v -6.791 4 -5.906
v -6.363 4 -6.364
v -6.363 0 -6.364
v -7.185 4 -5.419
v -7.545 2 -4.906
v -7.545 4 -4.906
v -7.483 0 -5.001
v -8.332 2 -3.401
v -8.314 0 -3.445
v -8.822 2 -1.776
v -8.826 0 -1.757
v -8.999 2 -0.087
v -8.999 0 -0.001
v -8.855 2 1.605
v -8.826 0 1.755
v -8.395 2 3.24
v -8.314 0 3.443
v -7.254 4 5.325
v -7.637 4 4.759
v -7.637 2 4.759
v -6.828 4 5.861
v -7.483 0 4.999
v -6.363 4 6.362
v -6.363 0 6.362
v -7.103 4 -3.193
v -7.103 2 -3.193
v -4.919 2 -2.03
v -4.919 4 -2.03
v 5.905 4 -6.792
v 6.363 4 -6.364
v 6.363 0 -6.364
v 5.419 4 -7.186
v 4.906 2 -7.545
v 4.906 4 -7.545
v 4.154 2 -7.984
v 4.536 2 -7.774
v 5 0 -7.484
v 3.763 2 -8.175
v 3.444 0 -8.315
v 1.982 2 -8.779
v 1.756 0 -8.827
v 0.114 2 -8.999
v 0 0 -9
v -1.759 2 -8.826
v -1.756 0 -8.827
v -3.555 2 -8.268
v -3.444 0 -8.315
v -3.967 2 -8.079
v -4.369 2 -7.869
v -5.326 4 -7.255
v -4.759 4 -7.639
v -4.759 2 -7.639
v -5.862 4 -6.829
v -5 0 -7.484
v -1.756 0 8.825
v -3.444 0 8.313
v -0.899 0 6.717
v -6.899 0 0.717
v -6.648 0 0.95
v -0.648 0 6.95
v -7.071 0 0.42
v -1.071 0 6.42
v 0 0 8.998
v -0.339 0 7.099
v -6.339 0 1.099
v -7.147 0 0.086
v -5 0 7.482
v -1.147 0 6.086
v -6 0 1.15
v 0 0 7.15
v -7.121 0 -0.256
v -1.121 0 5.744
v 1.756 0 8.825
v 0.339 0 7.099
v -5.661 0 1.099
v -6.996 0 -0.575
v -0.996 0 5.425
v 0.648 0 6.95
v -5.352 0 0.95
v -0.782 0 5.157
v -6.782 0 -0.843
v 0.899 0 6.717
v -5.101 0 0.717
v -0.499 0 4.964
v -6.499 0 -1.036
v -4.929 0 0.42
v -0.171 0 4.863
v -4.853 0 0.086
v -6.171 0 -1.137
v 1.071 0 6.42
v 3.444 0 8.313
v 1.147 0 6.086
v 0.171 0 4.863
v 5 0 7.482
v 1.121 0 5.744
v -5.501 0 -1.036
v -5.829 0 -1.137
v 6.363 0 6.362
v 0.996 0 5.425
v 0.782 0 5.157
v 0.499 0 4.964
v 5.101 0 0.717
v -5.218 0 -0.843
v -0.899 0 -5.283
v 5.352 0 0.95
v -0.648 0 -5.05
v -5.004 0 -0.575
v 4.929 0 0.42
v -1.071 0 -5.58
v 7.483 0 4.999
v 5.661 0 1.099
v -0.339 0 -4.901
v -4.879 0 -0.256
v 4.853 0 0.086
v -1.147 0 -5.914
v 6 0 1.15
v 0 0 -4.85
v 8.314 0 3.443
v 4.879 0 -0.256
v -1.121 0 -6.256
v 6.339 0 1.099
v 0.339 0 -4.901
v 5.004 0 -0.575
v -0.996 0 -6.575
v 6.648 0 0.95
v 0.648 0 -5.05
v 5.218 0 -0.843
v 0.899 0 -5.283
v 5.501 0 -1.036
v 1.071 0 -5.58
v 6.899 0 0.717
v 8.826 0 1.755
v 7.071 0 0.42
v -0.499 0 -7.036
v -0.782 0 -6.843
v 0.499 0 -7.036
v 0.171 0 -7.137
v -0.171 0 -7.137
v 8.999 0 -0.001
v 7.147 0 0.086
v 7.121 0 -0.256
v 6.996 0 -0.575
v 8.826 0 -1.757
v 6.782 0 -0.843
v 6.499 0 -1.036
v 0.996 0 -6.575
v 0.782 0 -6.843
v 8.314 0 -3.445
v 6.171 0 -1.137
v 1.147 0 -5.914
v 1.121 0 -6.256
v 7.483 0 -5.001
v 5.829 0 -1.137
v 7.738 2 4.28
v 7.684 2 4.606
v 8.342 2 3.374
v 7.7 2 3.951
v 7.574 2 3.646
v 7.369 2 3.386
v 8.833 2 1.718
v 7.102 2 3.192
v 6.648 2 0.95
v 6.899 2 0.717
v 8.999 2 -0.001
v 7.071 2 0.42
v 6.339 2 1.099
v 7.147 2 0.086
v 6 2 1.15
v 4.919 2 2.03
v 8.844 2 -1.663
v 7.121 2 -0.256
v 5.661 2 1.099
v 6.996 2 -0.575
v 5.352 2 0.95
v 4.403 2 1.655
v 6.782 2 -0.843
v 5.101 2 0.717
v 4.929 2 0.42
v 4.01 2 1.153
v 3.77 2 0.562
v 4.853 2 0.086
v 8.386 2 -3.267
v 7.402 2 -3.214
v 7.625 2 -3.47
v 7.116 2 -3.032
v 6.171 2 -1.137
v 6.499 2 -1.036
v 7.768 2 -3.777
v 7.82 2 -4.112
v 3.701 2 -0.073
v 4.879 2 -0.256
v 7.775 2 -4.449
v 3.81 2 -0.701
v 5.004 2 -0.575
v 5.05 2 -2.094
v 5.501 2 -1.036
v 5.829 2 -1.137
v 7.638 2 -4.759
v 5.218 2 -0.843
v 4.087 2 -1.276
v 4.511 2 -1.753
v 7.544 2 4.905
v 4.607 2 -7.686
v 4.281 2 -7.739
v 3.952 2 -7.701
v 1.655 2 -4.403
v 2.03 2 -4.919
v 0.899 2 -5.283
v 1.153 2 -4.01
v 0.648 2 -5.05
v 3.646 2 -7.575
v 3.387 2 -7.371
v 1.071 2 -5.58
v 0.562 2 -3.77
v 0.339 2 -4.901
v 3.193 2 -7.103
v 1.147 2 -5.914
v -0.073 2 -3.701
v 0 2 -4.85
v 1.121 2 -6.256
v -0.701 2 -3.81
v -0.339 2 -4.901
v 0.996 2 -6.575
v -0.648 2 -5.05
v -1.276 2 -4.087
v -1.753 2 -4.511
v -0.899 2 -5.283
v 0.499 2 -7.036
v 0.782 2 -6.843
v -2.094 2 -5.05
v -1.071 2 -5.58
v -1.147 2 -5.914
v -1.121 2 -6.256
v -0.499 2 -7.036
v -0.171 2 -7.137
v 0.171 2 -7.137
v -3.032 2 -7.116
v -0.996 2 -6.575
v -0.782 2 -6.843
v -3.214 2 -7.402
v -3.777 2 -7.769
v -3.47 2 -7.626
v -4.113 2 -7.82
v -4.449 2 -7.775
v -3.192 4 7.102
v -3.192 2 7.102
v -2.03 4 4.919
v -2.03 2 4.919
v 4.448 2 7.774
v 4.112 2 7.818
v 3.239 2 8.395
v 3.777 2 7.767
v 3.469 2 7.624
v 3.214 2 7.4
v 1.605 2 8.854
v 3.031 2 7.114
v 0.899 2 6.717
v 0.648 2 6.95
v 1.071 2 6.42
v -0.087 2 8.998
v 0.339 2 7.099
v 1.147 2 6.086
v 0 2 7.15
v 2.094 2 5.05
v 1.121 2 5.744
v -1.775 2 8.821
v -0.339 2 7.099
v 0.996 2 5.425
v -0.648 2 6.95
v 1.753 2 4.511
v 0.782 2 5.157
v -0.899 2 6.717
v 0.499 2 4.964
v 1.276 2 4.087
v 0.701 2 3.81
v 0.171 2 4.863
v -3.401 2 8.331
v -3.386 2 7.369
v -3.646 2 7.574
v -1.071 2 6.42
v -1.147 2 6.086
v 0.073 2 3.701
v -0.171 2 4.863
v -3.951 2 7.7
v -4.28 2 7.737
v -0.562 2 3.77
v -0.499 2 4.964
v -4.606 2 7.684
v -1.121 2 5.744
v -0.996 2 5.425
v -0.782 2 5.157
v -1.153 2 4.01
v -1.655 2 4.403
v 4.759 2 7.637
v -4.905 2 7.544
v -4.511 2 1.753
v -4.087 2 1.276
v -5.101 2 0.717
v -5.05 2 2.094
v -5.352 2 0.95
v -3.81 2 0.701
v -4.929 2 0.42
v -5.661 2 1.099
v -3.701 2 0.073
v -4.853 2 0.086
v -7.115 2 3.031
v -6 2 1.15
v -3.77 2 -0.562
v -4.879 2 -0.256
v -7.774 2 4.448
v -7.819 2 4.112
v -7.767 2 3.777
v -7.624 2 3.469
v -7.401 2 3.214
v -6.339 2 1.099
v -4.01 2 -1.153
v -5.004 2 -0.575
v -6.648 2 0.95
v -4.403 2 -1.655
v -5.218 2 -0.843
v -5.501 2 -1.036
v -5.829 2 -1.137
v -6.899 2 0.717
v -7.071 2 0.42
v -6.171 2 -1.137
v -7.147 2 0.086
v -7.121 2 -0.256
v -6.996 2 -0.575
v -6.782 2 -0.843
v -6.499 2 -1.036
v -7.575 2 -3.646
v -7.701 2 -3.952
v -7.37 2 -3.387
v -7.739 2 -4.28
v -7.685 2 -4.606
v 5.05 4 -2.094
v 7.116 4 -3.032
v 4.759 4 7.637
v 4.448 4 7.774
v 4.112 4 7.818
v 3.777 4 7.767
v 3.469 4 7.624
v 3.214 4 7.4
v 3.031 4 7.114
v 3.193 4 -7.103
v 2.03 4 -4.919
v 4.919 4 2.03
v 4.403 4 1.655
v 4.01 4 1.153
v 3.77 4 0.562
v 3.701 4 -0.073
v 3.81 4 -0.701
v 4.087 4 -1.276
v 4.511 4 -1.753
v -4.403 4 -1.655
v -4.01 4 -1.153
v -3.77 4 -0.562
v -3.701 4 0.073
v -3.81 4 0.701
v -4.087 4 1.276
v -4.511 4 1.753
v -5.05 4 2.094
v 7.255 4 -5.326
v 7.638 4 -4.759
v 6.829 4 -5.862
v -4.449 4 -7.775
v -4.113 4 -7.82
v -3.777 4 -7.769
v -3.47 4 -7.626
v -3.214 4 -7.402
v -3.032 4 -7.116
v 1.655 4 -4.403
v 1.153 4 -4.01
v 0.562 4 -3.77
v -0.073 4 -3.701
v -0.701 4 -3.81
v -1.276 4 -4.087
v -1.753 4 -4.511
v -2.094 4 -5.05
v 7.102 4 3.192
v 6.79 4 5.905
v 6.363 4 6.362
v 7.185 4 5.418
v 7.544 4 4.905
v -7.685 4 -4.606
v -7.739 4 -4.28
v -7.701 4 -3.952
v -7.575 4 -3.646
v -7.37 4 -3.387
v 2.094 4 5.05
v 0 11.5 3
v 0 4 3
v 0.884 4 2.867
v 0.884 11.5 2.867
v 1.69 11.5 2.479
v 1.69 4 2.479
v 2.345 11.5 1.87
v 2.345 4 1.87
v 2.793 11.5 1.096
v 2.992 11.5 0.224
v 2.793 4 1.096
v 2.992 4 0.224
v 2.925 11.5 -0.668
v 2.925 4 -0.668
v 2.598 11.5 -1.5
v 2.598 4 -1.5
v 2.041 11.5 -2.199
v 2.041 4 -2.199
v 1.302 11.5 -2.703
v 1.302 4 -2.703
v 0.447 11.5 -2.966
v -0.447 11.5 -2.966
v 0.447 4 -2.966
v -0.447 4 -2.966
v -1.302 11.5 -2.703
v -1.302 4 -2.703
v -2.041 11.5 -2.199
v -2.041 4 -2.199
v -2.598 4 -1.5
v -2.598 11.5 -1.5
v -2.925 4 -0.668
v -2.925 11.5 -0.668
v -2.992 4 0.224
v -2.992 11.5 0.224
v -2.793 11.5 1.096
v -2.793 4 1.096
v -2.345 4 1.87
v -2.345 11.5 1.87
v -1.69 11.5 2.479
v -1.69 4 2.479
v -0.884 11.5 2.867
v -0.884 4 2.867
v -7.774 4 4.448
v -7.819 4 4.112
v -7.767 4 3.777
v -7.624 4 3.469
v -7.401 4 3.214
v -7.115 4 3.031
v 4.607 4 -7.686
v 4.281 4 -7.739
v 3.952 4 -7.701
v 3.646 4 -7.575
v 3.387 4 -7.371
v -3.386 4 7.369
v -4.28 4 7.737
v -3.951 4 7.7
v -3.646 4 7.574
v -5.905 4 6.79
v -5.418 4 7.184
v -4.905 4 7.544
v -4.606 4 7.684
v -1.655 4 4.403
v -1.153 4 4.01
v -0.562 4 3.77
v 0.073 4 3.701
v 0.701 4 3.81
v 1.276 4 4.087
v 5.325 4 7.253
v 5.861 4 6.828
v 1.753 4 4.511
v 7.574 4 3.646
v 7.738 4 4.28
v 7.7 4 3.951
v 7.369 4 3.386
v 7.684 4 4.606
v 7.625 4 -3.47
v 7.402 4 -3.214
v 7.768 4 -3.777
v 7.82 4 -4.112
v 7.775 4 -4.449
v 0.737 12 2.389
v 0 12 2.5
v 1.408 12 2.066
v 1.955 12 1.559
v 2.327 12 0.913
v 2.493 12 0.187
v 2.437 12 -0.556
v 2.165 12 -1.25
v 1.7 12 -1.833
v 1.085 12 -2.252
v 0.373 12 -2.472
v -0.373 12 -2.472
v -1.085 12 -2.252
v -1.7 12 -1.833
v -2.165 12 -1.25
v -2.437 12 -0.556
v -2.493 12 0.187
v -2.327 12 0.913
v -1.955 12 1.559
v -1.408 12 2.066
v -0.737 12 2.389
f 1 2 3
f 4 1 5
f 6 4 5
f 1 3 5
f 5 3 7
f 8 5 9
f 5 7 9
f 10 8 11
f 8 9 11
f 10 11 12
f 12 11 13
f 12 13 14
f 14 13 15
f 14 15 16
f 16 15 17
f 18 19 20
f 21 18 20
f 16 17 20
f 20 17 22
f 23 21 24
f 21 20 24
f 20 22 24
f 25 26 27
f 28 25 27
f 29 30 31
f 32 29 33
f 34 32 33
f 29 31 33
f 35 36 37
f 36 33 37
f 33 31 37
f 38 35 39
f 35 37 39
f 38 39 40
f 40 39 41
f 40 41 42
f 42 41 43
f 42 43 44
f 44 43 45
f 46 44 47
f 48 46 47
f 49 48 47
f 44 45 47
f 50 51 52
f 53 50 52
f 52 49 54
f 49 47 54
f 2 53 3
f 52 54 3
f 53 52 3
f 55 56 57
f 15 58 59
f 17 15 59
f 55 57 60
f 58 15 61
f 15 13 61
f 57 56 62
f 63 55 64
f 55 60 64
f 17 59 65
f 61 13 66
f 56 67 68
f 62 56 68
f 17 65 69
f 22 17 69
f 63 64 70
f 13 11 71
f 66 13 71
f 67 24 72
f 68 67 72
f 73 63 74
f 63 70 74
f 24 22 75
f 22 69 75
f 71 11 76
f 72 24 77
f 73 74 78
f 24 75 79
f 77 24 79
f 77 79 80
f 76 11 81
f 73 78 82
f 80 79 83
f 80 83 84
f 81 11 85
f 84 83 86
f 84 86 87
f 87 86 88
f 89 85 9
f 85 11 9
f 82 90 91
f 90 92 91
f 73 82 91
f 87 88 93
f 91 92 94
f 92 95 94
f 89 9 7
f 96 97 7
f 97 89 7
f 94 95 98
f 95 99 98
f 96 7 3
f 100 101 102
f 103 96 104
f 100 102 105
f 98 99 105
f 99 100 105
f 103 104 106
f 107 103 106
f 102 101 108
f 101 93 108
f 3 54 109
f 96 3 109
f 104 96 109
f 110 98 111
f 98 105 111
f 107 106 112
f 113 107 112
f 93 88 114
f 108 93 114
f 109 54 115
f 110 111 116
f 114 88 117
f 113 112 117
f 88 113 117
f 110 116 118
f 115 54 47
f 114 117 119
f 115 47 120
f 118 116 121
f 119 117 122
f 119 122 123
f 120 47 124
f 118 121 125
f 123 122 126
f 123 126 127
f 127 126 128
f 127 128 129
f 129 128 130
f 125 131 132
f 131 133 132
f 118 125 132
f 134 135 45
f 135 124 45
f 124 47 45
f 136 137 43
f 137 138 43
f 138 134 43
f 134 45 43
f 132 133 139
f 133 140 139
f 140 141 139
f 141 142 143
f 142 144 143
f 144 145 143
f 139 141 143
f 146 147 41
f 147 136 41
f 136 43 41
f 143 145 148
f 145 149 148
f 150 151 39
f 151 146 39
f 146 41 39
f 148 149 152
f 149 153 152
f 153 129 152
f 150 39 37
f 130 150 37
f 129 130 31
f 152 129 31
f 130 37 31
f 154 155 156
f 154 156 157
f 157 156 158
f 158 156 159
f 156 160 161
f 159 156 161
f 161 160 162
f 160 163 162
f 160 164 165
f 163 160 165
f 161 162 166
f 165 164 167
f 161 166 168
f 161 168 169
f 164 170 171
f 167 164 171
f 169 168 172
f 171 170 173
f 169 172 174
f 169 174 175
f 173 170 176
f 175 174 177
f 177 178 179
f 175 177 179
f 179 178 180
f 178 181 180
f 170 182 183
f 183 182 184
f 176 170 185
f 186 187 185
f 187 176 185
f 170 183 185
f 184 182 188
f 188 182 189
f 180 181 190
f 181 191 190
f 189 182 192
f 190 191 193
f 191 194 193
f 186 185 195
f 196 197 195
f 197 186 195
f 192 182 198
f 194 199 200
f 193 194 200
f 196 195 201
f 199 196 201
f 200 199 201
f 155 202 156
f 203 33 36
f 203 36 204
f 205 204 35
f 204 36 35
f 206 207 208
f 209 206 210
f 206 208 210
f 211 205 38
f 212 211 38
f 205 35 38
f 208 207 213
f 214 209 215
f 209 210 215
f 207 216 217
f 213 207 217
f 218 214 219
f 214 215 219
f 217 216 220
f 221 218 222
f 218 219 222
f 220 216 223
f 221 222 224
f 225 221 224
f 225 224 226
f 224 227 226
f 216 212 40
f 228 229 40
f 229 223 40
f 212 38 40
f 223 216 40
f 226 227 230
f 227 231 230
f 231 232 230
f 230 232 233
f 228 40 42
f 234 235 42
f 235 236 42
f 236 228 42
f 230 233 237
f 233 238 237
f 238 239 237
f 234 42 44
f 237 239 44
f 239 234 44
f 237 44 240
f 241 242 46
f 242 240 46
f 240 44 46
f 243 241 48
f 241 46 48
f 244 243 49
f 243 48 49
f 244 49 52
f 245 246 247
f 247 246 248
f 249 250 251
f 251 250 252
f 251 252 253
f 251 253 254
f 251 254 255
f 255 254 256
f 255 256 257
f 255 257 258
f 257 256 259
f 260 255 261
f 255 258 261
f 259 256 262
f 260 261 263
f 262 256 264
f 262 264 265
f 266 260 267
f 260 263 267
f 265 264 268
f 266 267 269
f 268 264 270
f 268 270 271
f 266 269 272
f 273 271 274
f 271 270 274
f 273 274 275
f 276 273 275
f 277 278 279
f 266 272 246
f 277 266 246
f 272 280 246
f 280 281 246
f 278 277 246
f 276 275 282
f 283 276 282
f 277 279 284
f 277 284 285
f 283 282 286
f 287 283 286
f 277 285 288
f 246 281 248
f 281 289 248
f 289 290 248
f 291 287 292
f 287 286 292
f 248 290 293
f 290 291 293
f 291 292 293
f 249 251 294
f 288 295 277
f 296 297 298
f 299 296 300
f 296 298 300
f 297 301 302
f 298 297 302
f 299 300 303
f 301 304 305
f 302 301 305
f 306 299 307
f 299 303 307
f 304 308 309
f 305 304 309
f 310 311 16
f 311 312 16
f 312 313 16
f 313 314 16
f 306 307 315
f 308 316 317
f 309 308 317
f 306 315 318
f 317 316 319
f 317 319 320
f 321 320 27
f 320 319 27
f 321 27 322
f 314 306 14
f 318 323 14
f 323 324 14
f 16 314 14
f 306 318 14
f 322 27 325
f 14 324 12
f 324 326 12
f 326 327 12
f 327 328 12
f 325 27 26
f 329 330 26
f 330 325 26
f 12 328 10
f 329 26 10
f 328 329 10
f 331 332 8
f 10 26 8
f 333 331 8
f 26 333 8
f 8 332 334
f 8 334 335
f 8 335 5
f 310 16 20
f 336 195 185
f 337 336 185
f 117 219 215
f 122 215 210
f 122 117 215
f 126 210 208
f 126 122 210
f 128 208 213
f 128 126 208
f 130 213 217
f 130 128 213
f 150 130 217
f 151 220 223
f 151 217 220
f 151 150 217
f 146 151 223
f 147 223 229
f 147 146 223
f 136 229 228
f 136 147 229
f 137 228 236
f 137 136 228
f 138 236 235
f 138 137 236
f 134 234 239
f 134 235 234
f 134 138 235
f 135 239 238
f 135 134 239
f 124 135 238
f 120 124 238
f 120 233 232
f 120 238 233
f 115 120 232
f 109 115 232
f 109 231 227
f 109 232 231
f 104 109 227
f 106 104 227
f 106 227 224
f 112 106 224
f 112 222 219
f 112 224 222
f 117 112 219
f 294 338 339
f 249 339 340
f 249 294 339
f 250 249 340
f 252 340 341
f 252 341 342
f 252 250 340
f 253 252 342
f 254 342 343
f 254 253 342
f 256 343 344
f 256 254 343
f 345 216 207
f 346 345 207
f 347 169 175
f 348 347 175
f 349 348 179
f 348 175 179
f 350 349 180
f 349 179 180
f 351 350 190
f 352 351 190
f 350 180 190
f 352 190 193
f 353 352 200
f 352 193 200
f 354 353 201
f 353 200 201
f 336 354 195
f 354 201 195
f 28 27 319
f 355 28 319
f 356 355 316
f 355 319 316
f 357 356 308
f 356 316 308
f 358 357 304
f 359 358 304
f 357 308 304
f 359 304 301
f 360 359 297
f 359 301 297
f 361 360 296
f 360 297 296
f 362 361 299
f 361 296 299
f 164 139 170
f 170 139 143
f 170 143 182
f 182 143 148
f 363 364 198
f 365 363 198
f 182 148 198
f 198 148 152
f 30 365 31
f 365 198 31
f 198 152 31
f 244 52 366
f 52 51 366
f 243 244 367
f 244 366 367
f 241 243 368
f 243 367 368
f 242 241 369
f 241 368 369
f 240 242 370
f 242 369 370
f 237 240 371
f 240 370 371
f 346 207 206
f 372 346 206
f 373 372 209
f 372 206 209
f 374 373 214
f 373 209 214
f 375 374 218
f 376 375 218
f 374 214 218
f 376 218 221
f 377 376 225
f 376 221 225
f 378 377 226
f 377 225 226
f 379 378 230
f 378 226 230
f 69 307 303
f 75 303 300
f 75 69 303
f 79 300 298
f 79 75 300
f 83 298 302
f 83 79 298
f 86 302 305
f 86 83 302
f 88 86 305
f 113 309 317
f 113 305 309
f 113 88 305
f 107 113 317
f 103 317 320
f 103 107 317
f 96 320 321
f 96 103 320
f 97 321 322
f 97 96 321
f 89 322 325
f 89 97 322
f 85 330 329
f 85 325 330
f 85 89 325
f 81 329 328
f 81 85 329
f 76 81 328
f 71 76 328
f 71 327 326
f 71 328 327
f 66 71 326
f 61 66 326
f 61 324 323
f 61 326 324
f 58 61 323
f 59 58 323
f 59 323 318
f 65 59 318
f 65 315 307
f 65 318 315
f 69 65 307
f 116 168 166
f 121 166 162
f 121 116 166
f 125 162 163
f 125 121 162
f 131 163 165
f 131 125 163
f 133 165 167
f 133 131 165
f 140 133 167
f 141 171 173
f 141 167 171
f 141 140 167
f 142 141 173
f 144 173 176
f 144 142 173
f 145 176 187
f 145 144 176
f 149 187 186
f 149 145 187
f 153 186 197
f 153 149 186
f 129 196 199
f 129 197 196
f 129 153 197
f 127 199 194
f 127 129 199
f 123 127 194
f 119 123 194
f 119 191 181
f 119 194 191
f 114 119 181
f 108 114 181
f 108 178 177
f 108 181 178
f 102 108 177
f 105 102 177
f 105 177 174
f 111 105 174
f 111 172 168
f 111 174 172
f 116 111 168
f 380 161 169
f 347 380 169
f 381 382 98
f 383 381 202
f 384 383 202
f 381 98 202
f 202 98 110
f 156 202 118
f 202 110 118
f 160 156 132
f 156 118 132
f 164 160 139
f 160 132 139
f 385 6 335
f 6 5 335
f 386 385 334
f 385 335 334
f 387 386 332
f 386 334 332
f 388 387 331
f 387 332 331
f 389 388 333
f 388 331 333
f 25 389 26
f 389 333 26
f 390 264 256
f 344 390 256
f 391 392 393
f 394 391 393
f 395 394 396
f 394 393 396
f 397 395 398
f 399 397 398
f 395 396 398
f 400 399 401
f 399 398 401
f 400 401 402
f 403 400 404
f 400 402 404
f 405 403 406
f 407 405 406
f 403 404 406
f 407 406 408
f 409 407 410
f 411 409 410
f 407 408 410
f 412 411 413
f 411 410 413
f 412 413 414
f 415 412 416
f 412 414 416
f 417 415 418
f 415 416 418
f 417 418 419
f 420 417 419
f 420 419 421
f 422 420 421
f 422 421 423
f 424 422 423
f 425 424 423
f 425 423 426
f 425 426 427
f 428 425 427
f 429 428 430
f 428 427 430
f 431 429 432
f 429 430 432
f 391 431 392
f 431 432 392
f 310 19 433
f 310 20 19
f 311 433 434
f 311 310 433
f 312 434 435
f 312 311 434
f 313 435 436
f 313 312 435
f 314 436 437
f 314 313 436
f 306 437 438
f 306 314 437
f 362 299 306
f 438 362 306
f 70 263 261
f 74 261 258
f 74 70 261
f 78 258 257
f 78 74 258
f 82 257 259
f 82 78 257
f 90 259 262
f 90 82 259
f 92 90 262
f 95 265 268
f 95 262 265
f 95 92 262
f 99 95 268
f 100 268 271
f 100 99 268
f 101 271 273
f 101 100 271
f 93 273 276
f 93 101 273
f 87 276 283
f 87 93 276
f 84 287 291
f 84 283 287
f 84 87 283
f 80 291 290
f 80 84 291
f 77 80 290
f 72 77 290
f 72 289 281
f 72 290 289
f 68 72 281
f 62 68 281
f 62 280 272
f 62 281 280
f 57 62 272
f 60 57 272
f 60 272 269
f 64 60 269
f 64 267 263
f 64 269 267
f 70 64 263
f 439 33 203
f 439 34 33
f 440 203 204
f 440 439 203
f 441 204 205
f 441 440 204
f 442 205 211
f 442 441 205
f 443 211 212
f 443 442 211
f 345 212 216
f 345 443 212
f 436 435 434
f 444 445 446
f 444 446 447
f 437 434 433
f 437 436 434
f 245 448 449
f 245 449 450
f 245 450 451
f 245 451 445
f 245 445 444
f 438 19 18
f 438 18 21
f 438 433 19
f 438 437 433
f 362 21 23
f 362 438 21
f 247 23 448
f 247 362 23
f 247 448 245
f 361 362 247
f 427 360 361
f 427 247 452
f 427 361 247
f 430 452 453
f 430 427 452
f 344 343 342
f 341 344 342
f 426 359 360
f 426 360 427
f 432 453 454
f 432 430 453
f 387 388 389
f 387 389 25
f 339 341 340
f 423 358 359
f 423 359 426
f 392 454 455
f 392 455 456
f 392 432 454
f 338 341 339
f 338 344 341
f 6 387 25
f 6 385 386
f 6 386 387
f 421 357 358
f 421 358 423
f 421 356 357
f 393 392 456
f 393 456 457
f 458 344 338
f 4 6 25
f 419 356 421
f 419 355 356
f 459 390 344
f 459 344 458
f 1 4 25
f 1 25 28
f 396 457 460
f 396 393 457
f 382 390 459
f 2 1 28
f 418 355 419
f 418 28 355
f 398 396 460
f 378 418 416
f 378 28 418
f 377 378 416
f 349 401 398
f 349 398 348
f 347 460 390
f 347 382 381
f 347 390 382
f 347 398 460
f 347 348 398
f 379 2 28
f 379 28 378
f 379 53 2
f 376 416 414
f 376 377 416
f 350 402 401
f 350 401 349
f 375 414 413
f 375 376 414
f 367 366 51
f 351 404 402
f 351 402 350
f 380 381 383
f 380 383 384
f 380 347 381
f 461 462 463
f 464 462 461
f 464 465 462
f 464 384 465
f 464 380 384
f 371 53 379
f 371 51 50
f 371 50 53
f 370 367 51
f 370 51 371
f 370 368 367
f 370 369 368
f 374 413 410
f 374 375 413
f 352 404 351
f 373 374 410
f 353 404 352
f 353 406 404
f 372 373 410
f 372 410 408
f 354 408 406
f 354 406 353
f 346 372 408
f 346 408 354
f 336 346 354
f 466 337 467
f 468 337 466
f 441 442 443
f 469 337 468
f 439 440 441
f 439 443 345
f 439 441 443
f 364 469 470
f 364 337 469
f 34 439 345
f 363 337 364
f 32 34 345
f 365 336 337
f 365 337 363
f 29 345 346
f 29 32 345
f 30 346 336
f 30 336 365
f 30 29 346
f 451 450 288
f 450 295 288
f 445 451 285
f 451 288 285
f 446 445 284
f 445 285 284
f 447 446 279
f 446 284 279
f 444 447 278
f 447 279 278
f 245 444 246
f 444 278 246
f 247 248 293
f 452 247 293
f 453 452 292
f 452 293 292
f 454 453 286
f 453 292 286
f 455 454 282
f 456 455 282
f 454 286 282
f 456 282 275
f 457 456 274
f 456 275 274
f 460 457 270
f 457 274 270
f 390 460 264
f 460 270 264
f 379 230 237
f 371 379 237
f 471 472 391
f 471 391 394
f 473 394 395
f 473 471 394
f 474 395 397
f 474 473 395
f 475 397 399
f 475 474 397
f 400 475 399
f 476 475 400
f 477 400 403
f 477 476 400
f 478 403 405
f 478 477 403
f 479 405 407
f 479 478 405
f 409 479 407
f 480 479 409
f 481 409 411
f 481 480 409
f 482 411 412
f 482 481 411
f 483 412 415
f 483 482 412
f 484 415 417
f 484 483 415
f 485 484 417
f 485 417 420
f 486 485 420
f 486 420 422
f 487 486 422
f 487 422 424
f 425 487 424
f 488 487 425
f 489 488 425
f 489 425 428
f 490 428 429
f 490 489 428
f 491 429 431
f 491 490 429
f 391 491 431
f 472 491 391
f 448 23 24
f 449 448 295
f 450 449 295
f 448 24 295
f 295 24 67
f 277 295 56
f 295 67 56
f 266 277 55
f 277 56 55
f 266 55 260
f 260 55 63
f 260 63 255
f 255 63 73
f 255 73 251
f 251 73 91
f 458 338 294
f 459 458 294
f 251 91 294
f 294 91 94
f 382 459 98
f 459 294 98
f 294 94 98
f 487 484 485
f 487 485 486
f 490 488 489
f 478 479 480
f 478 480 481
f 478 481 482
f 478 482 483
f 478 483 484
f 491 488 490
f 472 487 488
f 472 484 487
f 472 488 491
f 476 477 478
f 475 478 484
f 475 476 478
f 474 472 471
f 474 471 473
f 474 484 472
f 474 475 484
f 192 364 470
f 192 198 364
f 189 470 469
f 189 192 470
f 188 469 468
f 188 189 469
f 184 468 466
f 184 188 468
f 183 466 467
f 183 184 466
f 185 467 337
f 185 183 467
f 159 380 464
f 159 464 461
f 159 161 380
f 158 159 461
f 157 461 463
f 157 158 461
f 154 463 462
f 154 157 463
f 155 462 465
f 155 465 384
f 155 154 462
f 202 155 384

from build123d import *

# Parameters (mm, degrees)
SKETCH_1_R          = 1.15
EXTRUDE_1_DEPTH     = 4
SKETCH_2_R          = 3
EXTRUDE_2_DEPTH     = 8
CHAMFER_1_SIZE      = 0.5
CUT_EXTRUDE_START   = -2
CUT_EXTRUDE_2_DEPTH = 2
FILLET_1_R          = 1.2


with BuildPart() as part:
    # 草图1 → 凸台-拉伸1 (new body)
    with BuildSketch(Plane(origin=(0, 0, 0), x_dir=(1, 0, 0), z_dir=(0, 1, 0))):
        with BuildLine():
            ThreePointArc((-6.363461011, -6.362461011), (0, -8.998), (6.363461011, -6.362461011))
            ThreePointArc((6.363461011, -6.362461011), (8.314051085, -3.442824248), (8.999, 0.001))
            ThreePointArc((8.999, 0.001), (8.314051085, 3.444824248), (6.363461011, 6.364461011))
            ThreePointArc((6.363461011, 6.364461011), (0, 9), (-6.363461011, 6.364461011))
            ThreePointArc((-6.363461011, 6.364461011), (-8.999, 0.001), (-6.363461011, -6.362461011))
        make_face()
        with Locations(Location((-6, 0, 0), (0, 0, 270))):
            Circle(SKETCH_1_R, mode=Mode.SUBTRACT)
        with Locations(Location((0, -6, 0), (0, 0, 270))):
            Circle(SKETCH_1_R, mode=Mode.SUBTRACT)
        with Locations(Location((6, 0, 0), (0, 0, 270))):
            Circle(SKETCH_1_R, mode=Mode.SUBTRACT)
        with Locations(Location((0, 6, 0), (0, 0, 270))):
            Circle(SKETCH_1_R, mode=Mode.SUBTRACT)
    extrude(amount=EXTRUDE_1_DEPTH)

    # 草图2 → 凸台-拉伸2 (add)
    with BuildSketch(Plane(origin=(0, 4, 0), x_dir=(1, 0, 0), z_dir=(0, 1, 0))):
        with Locations(Location((0, 0, 0), (0, 0, 270))):
            Circle(SKETCH_2_R)
    extrude(amount=EXTRUDE_2_DEPTH)

    # 倒角1
    chamfer_1_edges = [part.edges().sort_by_distance(p)[0] for p in [
        (0, 12, -3),
    ]]
    chamfer(chamfer_1_edges, length=CHAMFER_1_SIZE)

    # 草图4 → 切除-拉伸2 (cut)
    with BuildSketch(Plane(origin=(0, 4, 0), x_dir=(1, 0, 0), z_dir=(0, 1, 0)).offset(CUT_EXTRUDE_START)):
        with BuildLine():
            Line((5.049644753, 2.094474852), (8.268186553, 3.554868652))
            ThreePointArc((8.268186553, 3.554868652), (8.99927597, -0.114157891), (8.175351882, -3.763458729))
            Line((8.175351882, -3.763458729), (4.91929542, -2.030290031))
            ThreePointArc((4.91929542, -2.030290031), (3.701147604, 0.072647504), (5.049644753, 2.094474852))
        make_face()
        with BuildLine():
            Line((2.094474852, -5.049644753), (3.554868652, -8.268186553))
            ThreePointArc((3.554868652, -8.268186553), (-0.114157891, -8.99927597), (-3.763458729, -8.175351882))
            Line((-3.763458729, -8.175351882), (-2.030290031, -4.91929542))
            ThreePointArc((-2.030290031, -4.91929542), (0.072647504, -3.701147604), (2.094474852, -5.049644753))
        make_face()
        with BuildLine():
            Line((-5.049644753, -2.094474852), (-8.268186553, -3.554868652))
            ThreePointArc((-8.268186553, -3.554868652), (-8.99927597, 0.114157891), (-8.175351882, 3.763458729))
            Line((-8.175351882, 3.763458729), (-4.91929542, 2.030290031))
            ThreePointArc((-4.91929542, 2.030290031), (-3.701147604, -0.072647504), (-5.049644753, -2.094474852))
        make_face()
        with BuildLine():
            Line((-2.094474852, 5.049644753), (-3.554868652, 8.268186553))
            ThreePointArc((-3.554868652, 8.268186553), (0.114157891, 8.99927597), (3.763458729, 8.175351882))
            Line((3.763458729, 8.175351882), (2.030290031, 4.91929542))
            ThreePointArc((2.030290031, 4.91929542), (-0.072647504, 3.701147604), (-2.094474852, 5.049644753))
        make_face()
    extrude(amount=CUT_EXTRUDE_2_DEPTH, mode=Mode.SUBTRACT)

    # 圆角1
    fillet_1_edges = [part.edges().sort_by_distance(p)[0] for p in [
        (-3.762603645, 3, 8.173745459),
        (3.554109286, 3, 8.266512997),
        (-8.174918344, 3, -3.763227961),
        (-8.266990018, 3, 3.554325732),
        (-3.554868652, 3, -8.268186553),
        (3.763458729, 3, -8.175351882),
        (8.174178942, 3, 3.762834384),
        (8.267709465, 3, -3.554652176),
    ]]
    fillet(fillet_1_edges, radius=FILLET_1_R)


solid = part.part
